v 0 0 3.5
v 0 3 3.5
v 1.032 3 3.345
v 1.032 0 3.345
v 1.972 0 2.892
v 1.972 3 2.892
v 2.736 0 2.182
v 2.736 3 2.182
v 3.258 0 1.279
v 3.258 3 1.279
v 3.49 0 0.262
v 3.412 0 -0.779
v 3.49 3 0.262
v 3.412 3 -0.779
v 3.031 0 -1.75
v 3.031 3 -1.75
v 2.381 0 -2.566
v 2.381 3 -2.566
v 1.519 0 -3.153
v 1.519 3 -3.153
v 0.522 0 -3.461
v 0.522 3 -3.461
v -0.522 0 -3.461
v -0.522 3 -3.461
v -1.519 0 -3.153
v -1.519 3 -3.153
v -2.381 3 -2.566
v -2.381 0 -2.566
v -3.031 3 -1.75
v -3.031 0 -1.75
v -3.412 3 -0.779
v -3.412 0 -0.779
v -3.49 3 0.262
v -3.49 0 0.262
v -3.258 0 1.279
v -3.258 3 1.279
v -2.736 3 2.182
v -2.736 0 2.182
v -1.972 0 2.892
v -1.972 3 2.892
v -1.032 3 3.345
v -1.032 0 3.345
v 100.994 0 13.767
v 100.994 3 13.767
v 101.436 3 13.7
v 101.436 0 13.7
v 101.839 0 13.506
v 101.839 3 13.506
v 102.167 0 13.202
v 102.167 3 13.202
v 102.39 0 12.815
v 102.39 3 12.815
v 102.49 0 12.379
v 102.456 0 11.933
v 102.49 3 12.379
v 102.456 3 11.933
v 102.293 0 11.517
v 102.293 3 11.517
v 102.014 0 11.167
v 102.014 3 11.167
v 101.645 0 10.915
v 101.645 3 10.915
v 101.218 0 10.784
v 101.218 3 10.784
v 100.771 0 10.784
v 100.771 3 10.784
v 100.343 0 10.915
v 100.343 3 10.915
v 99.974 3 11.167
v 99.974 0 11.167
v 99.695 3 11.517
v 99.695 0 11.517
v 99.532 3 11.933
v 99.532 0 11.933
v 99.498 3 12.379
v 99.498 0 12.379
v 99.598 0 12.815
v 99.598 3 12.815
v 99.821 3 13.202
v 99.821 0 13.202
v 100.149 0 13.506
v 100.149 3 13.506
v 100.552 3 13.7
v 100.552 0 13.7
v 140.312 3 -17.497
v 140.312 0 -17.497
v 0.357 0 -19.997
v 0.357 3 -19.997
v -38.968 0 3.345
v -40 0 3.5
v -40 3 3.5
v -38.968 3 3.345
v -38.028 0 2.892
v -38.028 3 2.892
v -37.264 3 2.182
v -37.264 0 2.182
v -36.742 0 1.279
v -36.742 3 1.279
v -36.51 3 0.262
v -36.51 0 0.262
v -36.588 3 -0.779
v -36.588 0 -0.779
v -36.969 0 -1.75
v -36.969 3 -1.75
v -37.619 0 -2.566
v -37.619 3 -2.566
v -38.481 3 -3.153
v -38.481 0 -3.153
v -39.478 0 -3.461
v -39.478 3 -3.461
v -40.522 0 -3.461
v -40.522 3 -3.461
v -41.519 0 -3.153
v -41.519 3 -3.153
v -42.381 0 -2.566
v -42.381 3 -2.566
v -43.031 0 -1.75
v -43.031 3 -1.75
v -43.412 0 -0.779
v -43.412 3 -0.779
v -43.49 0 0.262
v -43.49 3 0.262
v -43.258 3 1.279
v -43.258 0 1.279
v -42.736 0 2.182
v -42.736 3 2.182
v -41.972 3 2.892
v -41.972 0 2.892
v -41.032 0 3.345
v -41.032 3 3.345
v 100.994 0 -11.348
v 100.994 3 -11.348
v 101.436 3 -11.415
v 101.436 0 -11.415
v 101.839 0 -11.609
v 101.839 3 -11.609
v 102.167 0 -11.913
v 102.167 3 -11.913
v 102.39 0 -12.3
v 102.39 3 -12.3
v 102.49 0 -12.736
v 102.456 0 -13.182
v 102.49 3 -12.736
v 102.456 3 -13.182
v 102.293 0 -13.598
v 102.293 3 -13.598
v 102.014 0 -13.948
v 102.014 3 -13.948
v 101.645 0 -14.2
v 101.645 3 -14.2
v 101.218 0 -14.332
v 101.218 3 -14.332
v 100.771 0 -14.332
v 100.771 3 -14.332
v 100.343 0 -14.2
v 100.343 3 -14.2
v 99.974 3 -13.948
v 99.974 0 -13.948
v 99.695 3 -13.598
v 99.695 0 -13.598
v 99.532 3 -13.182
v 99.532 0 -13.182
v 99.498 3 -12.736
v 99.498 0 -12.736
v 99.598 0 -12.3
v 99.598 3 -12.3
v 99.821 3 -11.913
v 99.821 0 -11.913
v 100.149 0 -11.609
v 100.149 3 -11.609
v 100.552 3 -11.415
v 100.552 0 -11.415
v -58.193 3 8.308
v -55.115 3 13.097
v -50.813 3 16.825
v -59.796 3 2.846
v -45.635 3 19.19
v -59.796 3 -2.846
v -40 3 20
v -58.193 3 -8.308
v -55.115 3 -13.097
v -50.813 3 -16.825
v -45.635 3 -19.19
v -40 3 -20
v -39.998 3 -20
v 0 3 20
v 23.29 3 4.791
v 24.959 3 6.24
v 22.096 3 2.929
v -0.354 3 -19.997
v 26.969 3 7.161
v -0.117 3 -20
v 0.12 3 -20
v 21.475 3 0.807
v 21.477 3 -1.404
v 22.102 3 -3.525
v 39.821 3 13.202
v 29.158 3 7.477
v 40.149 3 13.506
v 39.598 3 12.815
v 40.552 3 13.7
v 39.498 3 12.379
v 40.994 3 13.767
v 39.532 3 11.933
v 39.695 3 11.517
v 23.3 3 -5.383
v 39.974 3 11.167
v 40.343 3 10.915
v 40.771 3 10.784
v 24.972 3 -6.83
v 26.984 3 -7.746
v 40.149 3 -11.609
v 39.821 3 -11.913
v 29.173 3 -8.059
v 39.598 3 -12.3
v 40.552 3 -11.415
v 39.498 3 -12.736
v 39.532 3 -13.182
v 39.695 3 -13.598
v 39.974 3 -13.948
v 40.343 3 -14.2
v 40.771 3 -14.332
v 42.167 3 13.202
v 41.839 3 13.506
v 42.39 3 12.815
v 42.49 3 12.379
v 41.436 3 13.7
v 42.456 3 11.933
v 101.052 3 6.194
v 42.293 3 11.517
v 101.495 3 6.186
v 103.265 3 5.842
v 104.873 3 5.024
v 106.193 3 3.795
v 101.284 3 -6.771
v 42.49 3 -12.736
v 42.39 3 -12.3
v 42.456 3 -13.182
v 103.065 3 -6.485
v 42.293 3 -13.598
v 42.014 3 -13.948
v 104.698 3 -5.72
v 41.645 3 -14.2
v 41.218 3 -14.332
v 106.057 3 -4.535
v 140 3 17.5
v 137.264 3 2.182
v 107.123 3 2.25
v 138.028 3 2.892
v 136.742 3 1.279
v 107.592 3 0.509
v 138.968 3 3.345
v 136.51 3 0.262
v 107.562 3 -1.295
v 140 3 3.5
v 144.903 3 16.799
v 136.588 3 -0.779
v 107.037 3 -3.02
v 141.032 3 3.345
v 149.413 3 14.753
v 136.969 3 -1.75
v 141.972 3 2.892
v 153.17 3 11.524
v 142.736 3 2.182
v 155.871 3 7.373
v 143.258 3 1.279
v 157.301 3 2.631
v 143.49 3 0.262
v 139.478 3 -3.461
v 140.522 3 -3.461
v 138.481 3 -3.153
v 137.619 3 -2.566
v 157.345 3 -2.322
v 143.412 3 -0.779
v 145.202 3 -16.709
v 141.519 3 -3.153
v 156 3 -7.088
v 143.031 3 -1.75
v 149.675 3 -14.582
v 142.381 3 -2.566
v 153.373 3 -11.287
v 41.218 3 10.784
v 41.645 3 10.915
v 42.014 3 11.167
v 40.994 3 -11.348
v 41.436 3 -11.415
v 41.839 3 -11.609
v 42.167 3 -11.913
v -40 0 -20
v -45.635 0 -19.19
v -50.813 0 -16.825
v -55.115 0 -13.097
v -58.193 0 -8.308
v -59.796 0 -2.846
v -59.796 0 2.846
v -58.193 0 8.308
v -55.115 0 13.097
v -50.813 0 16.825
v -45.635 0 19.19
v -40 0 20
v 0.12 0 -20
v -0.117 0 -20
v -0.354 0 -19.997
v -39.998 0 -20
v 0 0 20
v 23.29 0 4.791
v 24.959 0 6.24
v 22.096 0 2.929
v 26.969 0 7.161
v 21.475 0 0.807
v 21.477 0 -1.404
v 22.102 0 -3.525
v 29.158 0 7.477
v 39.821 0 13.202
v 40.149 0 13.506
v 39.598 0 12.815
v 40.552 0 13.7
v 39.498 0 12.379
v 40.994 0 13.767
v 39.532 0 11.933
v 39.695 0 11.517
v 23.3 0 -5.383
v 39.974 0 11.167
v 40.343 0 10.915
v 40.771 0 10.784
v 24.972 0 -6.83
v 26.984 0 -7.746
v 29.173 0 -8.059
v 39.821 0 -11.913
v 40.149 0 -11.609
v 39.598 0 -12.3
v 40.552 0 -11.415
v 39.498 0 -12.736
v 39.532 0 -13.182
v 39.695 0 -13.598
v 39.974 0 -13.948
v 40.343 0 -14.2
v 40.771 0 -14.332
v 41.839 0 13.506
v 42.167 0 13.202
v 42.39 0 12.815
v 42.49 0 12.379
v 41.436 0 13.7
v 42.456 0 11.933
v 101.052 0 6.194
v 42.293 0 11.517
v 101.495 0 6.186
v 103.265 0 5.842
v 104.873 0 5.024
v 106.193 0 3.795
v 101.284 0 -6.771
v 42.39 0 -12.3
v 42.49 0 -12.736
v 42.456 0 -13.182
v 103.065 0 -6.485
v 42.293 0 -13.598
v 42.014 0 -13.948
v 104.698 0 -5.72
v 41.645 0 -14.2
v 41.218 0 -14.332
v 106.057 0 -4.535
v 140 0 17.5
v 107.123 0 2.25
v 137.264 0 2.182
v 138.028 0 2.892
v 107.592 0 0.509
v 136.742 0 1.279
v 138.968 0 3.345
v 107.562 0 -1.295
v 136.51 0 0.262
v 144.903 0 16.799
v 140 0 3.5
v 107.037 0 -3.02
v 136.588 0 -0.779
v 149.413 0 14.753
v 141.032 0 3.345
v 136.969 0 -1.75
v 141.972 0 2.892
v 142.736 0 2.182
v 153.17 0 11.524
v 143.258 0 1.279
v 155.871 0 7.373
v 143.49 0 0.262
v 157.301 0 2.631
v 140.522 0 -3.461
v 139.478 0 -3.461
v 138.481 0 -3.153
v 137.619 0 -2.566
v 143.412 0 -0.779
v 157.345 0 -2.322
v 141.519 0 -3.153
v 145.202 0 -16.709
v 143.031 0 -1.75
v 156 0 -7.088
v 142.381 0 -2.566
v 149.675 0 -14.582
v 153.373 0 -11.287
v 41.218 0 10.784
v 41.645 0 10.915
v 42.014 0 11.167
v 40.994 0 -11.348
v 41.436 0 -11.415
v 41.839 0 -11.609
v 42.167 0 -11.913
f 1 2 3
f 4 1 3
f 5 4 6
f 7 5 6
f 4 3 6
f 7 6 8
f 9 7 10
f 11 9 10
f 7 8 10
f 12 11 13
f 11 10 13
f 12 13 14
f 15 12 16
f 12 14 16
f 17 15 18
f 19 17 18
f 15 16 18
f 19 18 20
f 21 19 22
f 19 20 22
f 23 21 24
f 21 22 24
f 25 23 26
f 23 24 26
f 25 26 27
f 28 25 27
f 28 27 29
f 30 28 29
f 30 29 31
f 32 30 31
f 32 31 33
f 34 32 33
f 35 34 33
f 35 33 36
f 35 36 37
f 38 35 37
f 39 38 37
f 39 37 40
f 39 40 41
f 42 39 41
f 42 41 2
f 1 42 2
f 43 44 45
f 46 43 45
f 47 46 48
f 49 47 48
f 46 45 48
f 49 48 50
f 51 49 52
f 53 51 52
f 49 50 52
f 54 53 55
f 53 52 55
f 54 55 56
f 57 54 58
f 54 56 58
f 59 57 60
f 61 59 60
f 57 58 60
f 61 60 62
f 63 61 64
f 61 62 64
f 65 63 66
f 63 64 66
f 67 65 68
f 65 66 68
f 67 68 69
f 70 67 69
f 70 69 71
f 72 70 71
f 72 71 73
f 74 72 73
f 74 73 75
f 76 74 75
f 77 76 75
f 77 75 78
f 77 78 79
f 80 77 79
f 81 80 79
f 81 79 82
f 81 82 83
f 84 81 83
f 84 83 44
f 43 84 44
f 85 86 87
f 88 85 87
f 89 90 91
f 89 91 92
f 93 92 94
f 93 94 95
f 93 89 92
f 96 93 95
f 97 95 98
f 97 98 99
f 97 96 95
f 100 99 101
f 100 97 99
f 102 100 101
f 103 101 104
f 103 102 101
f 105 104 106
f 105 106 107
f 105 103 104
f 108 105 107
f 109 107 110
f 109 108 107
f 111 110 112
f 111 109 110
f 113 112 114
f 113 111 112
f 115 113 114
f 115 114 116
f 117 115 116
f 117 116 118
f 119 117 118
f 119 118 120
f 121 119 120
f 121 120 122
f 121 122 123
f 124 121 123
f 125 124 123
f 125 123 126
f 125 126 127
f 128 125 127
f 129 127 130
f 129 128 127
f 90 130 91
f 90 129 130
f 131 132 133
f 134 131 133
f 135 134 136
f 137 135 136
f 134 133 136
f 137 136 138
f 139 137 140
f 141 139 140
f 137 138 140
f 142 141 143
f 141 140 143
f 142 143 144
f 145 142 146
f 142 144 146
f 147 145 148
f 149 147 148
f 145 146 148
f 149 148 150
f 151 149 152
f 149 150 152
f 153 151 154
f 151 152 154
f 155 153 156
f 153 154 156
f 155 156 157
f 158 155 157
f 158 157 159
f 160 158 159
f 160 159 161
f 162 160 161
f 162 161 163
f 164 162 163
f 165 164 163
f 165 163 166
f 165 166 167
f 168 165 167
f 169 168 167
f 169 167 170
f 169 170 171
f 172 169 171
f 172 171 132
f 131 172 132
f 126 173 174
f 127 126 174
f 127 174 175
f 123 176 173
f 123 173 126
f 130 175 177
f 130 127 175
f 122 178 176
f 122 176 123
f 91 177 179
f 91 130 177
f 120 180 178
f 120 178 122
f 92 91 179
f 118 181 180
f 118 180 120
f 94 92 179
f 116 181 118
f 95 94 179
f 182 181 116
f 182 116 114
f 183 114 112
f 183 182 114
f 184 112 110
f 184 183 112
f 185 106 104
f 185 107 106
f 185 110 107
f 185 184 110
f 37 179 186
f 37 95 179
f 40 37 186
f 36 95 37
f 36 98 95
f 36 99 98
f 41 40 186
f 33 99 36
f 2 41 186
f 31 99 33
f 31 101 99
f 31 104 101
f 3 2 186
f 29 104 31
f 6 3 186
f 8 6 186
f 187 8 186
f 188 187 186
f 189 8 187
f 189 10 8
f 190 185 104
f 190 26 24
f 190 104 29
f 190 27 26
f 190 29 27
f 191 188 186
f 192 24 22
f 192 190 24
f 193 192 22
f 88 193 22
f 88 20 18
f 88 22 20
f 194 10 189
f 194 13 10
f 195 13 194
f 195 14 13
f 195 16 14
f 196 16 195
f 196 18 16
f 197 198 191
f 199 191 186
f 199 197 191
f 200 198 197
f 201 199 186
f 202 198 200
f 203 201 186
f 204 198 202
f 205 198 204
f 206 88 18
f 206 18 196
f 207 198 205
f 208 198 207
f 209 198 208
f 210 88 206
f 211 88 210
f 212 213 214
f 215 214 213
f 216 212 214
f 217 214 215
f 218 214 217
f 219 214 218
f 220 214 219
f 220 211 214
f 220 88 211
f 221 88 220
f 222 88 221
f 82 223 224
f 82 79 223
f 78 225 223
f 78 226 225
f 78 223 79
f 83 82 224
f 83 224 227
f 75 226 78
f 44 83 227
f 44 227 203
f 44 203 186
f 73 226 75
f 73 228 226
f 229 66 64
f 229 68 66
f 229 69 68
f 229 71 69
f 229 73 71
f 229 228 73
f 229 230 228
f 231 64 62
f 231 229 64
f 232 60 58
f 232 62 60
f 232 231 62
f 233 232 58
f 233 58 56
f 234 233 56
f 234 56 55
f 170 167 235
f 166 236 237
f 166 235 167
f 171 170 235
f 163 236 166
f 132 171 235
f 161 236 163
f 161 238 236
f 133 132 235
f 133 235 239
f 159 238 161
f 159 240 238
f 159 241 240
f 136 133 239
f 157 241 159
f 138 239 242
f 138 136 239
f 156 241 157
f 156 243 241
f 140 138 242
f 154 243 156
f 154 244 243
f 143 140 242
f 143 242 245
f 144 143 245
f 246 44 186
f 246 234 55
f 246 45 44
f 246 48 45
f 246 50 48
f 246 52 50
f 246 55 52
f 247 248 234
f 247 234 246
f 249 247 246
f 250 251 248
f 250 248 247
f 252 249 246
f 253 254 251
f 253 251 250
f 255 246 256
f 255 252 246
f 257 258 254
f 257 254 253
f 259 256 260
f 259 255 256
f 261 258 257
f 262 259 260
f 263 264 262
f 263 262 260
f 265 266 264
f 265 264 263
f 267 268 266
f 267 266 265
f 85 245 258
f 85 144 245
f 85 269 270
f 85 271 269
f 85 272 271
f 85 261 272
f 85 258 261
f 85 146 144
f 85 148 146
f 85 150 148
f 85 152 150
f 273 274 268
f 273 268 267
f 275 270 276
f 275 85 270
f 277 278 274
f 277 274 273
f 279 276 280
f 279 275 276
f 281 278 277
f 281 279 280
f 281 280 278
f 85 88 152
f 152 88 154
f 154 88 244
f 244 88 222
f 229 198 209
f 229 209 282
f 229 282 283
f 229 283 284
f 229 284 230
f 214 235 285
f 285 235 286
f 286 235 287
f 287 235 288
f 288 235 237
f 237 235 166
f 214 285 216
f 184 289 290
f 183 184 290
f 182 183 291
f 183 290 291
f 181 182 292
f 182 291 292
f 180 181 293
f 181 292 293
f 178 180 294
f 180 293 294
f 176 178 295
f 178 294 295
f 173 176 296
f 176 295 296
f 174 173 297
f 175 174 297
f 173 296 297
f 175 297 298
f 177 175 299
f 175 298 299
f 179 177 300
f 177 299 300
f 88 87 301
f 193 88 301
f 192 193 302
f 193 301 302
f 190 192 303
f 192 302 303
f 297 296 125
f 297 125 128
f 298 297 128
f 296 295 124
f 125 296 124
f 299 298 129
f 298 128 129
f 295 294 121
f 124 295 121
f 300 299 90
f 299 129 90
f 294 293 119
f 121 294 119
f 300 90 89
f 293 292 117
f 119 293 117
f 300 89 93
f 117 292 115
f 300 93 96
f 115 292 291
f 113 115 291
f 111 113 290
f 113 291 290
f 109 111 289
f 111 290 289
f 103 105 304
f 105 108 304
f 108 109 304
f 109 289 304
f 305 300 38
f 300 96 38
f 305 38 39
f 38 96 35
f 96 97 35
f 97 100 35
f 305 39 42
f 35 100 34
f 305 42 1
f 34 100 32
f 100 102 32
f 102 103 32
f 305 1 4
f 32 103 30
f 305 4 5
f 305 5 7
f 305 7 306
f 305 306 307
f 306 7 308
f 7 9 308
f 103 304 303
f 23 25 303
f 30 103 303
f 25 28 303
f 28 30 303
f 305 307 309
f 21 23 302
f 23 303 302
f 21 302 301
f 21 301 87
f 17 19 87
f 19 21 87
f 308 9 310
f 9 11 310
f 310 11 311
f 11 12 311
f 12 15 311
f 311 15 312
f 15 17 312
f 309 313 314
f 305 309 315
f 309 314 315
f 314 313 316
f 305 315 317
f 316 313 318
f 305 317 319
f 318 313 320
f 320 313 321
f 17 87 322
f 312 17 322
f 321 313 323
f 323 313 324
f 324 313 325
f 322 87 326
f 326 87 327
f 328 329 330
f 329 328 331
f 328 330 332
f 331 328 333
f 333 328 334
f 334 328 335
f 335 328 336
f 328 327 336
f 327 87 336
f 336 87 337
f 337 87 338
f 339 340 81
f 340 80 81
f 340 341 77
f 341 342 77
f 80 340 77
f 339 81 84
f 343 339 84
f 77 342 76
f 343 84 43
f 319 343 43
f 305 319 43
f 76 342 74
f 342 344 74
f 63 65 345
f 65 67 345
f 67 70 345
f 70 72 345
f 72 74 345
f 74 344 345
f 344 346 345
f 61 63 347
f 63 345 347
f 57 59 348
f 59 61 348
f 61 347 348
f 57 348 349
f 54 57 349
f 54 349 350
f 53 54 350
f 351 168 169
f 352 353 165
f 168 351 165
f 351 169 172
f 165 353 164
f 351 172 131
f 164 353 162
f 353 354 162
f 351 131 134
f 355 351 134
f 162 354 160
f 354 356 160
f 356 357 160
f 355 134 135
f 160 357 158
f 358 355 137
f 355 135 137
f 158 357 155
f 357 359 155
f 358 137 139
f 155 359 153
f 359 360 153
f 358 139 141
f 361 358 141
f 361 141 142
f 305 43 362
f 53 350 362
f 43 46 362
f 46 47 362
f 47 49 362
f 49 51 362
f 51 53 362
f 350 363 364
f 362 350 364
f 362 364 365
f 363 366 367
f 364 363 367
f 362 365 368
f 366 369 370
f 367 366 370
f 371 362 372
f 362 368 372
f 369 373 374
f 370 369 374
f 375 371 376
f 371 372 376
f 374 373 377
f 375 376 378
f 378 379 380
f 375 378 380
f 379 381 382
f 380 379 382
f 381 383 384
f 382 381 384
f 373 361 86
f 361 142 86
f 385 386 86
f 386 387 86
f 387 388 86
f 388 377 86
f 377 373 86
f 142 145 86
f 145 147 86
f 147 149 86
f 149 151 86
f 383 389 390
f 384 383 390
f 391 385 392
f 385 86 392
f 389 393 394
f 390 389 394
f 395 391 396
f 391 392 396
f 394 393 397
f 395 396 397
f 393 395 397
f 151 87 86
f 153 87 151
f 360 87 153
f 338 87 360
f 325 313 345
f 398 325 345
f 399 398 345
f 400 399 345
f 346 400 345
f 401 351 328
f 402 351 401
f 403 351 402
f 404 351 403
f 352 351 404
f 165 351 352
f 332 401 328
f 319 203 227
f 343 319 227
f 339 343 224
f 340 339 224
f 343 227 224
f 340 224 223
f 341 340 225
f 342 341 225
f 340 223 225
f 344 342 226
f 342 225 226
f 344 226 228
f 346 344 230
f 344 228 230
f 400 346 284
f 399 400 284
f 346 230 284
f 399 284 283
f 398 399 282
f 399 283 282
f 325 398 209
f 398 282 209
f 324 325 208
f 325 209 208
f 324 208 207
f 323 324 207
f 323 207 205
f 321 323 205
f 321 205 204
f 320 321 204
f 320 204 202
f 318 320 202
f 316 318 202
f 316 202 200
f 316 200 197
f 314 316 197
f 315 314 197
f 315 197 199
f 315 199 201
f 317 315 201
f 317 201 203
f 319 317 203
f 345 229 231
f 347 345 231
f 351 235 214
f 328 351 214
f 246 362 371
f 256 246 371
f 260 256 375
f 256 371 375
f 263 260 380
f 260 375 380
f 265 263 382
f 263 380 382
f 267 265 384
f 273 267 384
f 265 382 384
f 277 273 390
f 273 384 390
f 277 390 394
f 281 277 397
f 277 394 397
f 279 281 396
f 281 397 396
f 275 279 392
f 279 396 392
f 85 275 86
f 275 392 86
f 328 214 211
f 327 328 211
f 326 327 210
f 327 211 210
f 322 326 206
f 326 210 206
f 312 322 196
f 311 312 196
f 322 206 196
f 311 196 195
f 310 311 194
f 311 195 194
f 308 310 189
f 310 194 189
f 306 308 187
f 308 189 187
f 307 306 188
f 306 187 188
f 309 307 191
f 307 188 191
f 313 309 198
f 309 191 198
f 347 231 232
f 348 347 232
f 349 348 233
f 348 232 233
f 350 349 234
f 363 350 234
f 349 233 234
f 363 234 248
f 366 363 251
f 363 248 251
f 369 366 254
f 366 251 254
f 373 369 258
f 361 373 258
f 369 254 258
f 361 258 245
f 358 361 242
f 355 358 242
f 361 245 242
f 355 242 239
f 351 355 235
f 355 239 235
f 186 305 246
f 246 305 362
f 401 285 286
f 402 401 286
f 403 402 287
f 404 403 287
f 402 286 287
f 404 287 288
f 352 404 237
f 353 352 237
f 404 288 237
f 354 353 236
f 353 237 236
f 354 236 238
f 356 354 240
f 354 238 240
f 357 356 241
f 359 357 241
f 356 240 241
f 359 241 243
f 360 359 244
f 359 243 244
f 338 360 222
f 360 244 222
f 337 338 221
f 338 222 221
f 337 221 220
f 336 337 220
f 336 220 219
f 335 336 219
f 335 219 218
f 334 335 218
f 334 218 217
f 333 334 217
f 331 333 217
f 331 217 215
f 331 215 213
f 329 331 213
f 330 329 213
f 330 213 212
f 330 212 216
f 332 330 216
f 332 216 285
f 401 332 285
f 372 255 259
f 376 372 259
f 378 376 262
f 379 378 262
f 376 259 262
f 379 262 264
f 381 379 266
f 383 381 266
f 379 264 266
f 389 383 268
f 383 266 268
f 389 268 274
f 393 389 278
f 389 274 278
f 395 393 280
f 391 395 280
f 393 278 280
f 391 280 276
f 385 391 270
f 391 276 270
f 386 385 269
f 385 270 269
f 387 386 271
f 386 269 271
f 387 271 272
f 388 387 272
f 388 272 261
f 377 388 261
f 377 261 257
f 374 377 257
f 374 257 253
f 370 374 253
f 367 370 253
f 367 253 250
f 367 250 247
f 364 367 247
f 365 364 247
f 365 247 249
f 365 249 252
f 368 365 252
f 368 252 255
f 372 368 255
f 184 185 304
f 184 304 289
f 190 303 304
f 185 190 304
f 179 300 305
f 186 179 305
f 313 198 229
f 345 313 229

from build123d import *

# Parameters (mm, degrees)
BOSS_EXTRUDE1_DEPTH = 3
SKETCH2_R           = 3.5
CUT_EXTRUDE1_DEPTH  = 159.793104384
CUT_EXTRUDE3_DEPTH  = 159.793104384
BOSS_EXTRUDE2_START = -3
SKETCH10_R          = 3.5
BOSS_EXTRUDE2_DEPTH = 3
SKETCH11_R          = 1.5
CUT_EXTRUDE4_DEPTH  = 10


with BuildPart() as part:
    # Sketch1 → Boss-Extrude1 (new body)
    with BuildSketch(Plane(origin=(0, 0, 0), x_dir=(1, 0, 0), z_dir=(0, 1, 0))):
        with BuildLine():
            Line((140.3125, 17.497209599), (0.357142857, 19.99681097))
            ThreePointArc((0.357142857, 19.99681097), (-19.999202727, 0.178578547), (0, -20))
            Line((0, -20), (140, -17.5))
            ThreePointArc((140, -17.5), (157.499302386, -0.156256229), (140.3125, 17.497209599))
        make_face()
    extrude(amount=BOSS_EXTRUDE1_DEPTH)

    # Sketch2 → Cut-Extrude1 (cut, through all)
    with BuildSketch(Plane(origin=(0, 3, 0), x_dir=(1, 0, 0), z_dir=(0, 1, 0))):
        with Locations(Location((0, 0, 0), (0, 0, 270))):
            Circle(SKETCH2_R)
        with Locations(Location((140, 0, 0), (0, 0, 270))):
            Circle(SKETCH2_R)
    extrude(amount=-CUT_EXTRUDE1_DEPTH, mode=Mode.SUBTRACT)

    # Sketch4 → Cut-Extrude3 (cut, through all)
    with BuildSketch(Plane(origin=(0, 3, 0), x_dir=(1, 0, 0), z_dir=(0, 1, 0))):
        with BuildLine():
            ThreePointArc((101.494647455, -6.185682468), (107.64017994, 0.394224207), (101.283865867, 6.770744637))
            Line((101.283865867, 6.770744637), (29.173044697, 8.058643229))
            ThreePointArc((29.173044697, 8.058643229), (21.397292905, 0.29833633), (29.157599804, -7.477415462))
            Line((29.157599804, -7.477415462), (101.052392136, -6.193579885))
            Line((101.052392136, -6.193579885), (101.494647455, -6.185682468))
        make_face()
    extrude(amount=-CUT_EXTRUDE3_DEPTH, mode=Mode.SUBTRACT)

    # Sketch10 → Boss-Extrude2 (add)
    with BuildSketch(Plane(origin=(0, 3, 0), x_dir=(1, 0, 0), z_dir=(0, 1, 0)).offset(BOSS_EXTRUDE2_START)):
        with BuildLine():
            Line((-0.353982548, 19.996867164), (-39.998419596, 19.999999875))
            Line((-39.998419596, 19.999999875), (-40, 20))
            ThreePointArc((-40, 19.999999938), (-59.999999938, -3.1e-08), (-40, -20))
            Line((-40, -20), (0, -20))
            ThreePointArc((0, -20), (-19.999216776, -0.176998206), (-0.353982548, 19.996867164))
        make_face()
        with Locations(Location((-40, 0, 0), (0, 0, 270))):
            Circle(SKETCH10_R, mode=Mode.SUBTRACT)
    extrude(amount=BOSS_EXTRUDE2_DEPTH)

    # Sketch11 → Cut-Extrude4 (cut)
    with BuildSketch(Plane(origin=(0, 3, 0), x_dir=(1, 0, 0), z_dir=(0, 1, 0))):
        with Locations(Location((40.994069635, 12.848317219, 0), (0, 0, 270))):
            Circle(SKETCH11_R)
        with Locations(Location((40.994069635, -12.26684706, 0), (0, 0, 270))):
            Circle(SKETCH11_R)
        with Locations(Location((100.994069635, -12.26684706, 0), (0, 0, 270))):
            Circle(SKETCH11_R)
        with Locations(Location((100.994069635, 12.848317219, 0), (0, 0, 270))):
            Circle(SKETCH11_R)
    extrude(amount=-CUT_EXTRUDE4_DEPTH, mode=Mode.SUBTRACT)


solid = part.part
